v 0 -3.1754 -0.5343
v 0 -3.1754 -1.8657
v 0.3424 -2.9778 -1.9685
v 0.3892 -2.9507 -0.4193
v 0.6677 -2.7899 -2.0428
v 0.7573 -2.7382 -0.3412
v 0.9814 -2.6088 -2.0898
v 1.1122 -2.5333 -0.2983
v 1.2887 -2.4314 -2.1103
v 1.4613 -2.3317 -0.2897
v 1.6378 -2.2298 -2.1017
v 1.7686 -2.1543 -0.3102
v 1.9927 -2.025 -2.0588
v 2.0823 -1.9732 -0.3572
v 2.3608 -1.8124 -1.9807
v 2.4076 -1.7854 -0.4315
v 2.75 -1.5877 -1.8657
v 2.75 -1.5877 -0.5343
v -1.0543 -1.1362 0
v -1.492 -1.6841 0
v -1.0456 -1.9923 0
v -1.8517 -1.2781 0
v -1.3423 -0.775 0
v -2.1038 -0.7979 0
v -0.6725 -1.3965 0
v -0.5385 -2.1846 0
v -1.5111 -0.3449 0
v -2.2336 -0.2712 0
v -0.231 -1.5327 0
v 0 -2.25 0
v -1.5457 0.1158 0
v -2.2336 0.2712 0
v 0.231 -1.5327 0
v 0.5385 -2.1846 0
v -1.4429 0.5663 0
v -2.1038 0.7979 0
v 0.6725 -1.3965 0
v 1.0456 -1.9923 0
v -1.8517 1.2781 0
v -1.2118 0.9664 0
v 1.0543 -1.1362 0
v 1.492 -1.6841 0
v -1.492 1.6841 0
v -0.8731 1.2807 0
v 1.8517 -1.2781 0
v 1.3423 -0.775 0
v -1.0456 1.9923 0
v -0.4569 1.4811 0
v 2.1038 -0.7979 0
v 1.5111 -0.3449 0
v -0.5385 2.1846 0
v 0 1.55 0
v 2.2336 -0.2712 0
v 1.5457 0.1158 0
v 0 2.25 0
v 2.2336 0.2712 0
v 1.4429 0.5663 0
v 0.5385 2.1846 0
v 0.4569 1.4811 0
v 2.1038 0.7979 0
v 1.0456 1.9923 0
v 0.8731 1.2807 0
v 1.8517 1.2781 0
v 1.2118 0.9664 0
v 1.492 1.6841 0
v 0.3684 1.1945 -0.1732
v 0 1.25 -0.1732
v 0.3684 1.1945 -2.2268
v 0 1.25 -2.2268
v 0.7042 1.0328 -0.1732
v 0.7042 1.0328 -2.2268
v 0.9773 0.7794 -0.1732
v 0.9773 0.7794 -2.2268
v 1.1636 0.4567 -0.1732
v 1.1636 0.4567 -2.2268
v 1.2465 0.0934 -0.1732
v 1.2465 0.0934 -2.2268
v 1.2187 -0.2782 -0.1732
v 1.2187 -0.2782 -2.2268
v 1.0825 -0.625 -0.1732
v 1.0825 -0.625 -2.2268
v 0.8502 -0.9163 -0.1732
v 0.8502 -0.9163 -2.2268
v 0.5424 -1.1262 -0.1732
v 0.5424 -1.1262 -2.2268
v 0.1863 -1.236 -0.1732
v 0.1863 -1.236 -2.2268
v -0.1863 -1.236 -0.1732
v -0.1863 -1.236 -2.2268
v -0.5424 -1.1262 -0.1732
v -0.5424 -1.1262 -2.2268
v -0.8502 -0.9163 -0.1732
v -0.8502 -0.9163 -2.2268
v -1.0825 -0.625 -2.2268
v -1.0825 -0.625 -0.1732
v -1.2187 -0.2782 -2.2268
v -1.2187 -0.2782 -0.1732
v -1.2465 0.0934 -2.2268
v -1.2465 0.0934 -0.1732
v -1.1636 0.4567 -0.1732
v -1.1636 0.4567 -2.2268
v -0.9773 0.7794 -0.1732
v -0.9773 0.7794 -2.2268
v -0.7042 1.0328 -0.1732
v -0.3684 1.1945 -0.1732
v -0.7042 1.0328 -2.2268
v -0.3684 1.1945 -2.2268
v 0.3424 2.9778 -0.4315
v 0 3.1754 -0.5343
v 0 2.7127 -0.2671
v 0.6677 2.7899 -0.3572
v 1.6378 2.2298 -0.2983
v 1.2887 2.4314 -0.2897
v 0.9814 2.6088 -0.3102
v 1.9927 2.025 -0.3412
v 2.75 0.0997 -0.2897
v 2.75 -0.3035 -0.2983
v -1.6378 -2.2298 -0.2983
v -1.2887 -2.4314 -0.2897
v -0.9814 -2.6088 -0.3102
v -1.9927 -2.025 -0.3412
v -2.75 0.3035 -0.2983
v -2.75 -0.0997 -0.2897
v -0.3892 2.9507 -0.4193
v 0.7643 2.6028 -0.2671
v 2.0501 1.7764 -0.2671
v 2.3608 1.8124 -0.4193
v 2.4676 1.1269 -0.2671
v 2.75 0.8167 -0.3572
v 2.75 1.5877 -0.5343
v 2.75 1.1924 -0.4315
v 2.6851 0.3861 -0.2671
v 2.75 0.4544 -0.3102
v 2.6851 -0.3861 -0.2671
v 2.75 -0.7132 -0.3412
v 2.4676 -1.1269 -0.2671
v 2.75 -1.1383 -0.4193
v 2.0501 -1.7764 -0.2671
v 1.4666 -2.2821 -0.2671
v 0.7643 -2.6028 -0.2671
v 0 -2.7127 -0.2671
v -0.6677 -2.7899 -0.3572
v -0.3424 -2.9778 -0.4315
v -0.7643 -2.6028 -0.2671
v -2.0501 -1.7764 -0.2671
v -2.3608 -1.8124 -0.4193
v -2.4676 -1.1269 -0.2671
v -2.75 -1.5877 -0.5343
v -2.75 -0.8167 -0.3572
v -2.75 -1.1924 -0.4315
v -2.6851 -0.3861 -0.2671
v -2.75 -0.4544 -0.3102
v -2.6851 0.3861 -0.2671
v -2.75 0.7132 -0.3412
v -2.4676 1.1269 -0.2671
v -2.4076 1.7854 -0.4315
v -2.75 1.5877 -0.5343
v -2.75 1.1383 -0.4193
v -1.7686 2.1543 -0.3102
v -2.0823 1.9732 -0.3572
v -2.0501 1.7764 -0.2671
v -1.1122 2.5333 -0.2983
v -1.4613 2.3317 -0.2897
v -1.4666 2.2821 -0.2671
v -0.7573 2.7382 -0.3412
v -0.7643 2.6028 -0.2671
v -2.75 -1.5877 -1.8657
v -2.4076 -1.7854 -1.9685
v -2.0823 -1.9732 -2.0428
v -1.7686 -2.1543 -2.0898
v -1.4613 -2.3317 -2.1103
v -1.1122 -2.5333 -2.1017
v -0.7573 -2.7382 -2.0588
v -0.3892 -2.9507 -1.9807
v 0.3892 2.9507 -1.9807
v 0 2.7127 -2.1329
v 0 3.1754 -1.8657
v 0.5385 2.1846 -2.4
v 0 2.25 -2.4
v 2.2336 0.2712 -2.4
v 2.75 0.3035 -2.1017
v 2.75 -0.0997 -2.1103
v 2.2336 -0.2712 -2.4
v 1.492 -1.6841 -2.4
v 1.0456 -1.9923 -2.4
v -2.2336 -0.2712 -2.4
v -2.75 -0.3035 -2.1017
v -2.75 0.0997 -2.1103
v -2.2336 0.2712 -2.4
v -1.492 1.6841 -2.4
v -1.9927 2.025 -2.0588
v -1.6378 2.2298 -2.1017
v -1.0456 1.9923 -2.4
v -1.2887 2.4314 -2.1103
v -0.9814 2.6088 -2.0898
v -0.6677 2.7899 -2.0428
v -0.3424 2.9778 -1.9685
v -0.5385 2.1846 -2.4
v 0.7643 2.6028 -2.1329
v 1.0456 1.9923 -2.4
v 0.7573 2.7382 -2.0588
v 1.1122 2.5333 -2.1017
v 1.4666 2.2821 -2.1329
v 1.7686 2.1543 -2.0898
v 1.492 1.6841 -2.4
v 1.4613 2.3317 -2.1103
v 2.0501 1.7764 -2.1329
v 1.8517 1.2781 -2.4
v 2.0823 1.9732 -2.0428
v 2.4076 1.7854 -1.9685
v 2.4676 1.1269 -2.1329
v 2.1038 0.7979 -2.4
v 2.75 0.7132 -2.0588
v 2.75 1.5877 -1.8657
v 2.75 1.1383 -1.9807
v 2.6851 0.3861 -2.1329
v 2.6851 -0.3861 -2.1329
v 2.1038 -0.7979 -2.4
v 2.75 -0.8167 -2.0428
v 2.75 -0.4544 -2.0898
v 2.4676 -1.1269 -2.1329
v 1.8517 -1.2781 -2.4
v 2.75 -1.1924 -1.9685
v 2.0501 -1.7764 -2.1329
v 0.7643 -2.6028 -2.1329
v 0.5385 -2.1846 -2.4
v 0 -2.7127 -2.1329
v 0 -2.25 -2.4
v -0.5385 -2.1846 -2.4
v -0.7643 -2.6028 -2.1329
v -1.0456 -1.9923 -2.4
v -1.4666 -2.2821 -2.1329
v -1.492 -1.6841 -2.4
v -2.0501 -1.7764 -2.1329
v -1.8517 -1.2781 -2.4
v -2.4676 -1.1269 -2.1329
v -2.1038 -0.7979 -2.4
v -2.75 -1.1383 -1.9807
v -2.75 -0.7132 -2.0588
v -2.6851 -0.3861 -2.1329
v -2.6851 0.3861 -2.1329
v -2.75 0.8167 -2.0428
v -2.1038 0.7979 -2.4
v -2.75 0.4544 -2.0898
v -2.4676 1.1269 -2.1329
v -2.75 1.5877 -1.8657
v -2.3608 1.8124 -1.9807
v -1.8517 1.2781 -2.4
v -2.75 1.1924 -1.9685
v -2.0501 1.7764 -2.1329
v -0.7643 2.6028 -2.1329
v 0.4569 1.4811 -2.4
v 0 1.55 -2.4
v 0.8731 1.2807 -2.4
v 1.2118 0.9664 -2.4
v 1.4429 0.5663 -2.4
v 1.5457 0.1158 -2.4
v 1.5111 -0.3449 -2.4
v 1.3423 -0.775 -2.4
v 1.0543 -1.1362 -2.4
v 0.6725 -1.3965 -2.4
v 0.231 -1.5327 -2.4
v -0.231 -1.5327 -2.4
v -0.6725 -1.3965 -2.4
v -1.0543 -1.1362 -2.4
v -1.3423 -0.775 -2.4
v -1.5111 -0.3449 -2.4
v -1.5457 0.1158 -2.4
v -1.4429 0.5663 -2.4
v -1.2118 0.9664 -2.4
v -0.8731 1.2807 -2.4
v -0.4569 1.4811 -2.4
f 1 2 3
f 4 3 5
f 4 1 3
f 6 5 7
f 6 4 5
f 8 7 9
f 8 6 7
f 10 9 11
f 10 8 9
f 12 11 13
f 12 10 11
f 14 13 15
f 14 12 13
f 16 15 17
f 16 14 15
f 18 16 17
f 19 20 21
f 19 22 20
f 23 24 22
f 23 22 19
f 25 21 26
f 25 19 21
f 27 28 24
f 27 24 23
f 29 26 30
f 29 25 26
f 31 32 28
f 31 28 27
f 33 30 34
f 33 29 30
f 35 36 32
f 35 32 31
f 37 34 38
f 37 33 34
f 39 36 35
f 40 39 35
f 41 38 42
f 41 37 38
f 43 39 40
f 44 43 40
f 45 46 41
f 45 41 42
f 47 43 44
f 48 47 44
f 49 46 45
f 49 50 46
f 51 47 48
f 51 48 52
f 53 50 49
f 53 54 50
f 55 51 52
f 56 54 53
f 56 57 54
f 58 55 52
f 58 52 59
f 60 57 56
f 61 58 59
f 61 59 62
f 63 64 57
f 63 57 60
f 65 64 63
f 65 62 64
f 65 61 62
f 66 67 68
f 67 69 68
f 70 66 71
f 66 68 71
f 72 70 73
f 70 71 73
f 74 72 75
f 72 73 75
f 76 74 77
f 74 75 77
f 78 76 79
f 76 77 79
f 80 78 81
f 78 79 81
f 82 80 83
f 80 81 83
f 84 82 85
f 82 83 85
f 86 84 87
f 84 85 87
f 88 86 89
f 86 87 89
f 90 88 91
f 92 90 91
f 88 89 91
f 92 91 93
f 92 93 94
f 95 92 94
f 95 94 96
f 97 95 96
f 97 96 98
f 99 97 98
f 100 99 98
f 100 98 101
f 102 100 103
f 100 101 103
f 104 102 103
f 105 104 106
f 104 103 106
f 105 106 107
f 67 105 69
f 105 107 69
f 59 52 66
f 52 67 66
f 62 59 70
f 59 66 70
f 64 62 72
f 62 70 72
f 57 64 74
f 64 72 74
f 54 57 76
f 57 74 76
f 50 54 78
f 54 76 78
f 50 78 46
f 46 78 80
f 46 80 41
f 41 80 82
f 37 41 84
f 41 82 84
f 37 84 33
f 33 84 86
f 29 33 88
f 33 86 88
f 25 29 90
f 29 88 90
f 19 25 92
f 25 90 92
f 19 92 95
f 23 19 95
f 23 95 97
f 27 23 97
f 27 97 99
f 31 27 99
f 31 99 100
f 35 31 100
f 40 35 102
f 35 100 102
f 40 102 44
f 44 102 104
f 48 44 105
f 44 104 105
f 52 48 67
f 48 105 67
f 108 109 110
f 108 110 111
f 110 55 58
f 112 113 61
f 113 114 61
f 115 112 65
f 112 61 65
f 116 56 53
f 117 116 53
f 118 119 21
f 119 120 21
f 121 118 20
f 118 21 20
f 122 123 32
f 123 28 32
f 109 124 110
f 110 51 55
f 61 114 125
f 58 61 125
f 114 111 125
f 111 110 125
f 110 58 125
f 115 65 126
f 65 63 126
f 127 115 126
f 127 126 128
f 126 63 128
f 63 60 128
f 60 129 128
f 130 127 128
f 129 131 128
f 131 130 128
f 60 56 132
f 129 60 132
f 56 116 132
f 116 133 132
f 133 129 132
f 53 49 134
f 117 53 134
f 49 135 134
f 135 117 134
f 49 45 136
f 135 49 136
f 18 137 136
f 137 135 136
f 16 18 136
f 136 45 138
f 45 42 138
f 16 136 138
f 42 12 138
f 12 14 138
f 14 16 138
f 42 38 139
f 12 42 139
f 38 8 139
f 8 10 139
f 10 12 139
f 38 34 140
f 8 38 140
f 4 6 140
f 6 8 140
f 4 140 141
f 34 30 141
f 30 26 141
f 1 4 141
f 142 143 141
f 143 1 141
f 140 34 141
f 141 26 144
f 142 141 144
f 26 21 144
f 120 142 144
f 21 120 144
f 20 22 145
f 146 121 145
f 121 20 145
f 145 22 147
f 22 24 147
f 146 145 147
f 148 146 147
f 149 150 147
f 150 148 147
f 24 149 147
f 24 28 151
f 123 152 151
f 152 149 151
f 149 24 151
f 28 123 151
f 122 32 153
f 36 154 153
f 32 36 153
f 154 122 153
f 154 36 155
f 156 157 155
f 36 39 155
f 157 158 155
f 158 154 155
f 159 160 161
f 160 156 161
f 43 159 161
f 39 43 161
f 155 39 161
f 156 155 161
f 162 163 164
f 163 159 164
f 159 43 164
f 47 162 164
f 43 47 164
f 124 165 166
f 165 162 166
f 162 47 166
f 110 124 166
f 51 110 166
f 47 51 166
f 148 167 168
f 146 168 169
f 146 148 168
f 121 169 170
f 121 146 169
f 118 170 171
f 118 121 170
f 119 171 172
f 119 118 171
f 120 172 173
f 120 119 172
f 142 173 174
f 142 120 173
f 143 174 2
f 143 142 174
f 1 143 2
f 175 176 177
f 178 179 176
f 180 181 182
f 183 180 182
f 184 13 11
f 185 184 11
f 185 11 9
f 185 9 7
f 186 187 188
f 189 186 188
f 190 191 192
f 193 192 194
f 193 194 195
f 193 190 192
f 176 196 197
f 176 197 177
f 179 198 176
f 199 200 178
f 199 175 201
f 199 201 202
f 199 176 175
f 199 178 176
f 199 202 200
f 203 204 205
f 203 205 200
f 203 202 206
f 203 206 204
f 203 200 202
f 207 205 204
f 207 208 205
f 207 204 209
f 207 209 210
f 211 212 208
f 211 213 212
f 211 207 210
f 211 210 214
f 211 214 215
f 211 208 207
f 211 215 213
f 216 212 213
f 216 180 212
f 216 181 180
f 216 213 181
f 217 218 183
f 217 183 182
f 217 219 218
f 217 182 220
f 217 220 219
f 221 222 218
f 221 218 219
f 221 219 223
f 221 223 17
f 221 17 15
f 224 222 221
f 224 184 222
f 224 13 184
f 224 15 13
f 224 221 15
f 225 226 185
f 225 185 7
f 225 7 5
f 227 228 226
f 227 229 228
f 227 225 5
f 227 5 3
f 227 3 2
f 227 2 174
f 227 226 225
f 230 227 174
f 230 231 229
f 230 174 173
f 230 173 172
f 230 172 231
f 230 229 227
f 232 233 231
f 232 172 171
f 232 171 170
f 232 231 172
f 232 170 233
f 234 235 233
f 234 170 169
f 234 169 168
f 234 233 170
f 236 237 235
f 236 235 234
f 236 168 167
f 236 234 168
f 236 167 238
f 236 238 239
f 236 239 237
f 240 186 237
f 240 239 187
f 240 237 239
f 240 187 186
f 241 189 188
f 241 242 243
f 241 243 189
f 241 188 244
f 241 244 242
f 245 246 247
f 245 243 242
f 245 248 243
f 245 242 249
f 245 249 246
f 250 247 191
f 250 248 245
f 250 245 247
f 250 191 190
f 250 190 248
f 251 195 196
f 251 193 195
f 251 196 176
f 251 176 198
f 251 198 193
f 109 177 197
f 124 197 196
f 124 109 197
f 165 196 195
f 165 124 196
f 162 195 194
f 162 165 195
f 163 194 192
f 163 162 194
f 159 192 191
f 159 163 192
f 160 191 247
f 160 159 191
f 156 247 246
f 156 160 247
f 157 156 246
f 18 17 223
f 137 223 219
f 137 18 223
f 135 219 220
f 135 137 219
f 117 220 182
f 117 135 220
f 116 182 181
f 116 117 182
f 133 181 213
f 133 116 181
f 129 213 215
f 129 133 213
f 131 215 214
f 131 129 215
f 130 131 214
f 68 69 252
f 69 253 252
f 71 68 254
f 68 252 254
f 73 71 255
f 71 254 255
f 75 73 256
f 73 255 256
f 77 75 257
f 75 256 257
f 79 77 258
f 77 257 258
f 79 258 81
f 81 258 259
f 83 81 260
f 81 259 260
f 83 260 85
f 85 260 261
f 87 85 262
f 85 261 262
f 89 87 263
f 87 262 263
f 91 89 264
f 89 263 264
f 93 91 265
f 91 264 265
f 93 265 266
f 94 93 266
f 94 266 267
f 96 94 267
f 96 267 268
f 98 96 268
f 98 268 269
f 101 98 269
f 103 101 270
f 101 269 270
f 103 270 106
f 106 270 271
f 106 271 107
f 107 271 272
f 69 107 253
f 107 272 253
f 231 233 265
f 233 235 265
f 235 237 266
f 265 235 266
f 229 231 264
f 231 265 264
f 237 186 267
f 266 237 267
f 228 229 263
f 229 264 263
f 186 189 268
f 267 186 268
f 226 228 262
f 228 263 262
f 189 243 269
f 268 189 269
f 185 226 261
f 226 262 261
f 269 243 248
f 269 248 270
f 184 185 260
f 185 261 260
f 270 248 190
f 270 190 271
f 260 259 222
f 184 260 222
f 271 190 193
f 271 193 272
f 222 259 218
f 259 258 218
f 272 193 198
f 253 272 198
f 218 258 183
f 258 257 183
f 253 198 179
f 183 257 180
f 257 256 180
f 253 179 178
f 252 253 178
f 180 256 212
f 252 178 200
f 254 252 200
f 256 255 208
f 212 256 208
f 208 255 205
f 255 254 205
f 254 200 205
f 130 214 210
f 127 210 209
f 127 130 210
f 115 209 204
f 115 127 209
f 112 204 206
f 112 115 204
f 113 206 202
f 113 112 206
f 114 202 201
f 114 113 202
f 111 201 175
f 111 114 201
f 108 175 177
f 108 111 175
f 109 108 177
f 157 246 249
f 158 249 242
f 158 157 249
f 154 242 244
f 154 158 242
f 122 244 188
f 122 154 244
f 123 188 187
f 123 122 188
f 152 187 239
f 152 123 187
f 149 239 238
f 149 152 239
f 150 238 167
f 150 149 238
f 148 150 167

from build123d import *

# Parameters (mm, degrees)
BOSS_EXTRUDE1_DEPTH = 2.4


with BuildPart() as part:
    # Sketch1 → Boss-Extrude1 (new body)
    with BuildSketch(Plane.XY):
        Polygon((0, 3.175426481), (-2.75, 1.58771324), (-2.75, -1.58771324), (0, -3.175426481), (2.75, -1.58771324), (2.75, 1.58771324), align=None)
    extrude(amount=-BOSS_EXTRUDE1_DEPTH)

    # Sketch4 → Cut-Revolve1 (revolve, cut)
    with BuildSketch(Plane(origin=(0, 0, 0), x_dir=(0, 0, -1), z_dir=(1, 0, 0))):
        Polygon((2.4, 3.175426481), (1.865704772, 3.175426481), (2.4, 2.25), align=None)
        Polygon((0, 3.175426481), (0.534295228, 3.175426481), (0, 2.25), align=None)
    revolve(axis=Axis((0, 0, 0), (0, 0, -1)), mode=Mode.SUBTRACT)

    # Sketch5 → Cut-Revolve2 (revolve, cut)
    with BuildSketch(Plane(origin=(0, 0, 0), x_dir=(0, 0, -1), z_dir=(1, 0, 0))):
        Polygon((0, 0), (0, 1.55), (0.173205081, 1.25), (2.226794919, 1.25), (2.4, 1.55), (2.4, 0), align=None)
    revolve(axis=Axis((0, 0, 0), (0, 0, -1)), mode=Mode.SUBTRACT)


solid = part.part
